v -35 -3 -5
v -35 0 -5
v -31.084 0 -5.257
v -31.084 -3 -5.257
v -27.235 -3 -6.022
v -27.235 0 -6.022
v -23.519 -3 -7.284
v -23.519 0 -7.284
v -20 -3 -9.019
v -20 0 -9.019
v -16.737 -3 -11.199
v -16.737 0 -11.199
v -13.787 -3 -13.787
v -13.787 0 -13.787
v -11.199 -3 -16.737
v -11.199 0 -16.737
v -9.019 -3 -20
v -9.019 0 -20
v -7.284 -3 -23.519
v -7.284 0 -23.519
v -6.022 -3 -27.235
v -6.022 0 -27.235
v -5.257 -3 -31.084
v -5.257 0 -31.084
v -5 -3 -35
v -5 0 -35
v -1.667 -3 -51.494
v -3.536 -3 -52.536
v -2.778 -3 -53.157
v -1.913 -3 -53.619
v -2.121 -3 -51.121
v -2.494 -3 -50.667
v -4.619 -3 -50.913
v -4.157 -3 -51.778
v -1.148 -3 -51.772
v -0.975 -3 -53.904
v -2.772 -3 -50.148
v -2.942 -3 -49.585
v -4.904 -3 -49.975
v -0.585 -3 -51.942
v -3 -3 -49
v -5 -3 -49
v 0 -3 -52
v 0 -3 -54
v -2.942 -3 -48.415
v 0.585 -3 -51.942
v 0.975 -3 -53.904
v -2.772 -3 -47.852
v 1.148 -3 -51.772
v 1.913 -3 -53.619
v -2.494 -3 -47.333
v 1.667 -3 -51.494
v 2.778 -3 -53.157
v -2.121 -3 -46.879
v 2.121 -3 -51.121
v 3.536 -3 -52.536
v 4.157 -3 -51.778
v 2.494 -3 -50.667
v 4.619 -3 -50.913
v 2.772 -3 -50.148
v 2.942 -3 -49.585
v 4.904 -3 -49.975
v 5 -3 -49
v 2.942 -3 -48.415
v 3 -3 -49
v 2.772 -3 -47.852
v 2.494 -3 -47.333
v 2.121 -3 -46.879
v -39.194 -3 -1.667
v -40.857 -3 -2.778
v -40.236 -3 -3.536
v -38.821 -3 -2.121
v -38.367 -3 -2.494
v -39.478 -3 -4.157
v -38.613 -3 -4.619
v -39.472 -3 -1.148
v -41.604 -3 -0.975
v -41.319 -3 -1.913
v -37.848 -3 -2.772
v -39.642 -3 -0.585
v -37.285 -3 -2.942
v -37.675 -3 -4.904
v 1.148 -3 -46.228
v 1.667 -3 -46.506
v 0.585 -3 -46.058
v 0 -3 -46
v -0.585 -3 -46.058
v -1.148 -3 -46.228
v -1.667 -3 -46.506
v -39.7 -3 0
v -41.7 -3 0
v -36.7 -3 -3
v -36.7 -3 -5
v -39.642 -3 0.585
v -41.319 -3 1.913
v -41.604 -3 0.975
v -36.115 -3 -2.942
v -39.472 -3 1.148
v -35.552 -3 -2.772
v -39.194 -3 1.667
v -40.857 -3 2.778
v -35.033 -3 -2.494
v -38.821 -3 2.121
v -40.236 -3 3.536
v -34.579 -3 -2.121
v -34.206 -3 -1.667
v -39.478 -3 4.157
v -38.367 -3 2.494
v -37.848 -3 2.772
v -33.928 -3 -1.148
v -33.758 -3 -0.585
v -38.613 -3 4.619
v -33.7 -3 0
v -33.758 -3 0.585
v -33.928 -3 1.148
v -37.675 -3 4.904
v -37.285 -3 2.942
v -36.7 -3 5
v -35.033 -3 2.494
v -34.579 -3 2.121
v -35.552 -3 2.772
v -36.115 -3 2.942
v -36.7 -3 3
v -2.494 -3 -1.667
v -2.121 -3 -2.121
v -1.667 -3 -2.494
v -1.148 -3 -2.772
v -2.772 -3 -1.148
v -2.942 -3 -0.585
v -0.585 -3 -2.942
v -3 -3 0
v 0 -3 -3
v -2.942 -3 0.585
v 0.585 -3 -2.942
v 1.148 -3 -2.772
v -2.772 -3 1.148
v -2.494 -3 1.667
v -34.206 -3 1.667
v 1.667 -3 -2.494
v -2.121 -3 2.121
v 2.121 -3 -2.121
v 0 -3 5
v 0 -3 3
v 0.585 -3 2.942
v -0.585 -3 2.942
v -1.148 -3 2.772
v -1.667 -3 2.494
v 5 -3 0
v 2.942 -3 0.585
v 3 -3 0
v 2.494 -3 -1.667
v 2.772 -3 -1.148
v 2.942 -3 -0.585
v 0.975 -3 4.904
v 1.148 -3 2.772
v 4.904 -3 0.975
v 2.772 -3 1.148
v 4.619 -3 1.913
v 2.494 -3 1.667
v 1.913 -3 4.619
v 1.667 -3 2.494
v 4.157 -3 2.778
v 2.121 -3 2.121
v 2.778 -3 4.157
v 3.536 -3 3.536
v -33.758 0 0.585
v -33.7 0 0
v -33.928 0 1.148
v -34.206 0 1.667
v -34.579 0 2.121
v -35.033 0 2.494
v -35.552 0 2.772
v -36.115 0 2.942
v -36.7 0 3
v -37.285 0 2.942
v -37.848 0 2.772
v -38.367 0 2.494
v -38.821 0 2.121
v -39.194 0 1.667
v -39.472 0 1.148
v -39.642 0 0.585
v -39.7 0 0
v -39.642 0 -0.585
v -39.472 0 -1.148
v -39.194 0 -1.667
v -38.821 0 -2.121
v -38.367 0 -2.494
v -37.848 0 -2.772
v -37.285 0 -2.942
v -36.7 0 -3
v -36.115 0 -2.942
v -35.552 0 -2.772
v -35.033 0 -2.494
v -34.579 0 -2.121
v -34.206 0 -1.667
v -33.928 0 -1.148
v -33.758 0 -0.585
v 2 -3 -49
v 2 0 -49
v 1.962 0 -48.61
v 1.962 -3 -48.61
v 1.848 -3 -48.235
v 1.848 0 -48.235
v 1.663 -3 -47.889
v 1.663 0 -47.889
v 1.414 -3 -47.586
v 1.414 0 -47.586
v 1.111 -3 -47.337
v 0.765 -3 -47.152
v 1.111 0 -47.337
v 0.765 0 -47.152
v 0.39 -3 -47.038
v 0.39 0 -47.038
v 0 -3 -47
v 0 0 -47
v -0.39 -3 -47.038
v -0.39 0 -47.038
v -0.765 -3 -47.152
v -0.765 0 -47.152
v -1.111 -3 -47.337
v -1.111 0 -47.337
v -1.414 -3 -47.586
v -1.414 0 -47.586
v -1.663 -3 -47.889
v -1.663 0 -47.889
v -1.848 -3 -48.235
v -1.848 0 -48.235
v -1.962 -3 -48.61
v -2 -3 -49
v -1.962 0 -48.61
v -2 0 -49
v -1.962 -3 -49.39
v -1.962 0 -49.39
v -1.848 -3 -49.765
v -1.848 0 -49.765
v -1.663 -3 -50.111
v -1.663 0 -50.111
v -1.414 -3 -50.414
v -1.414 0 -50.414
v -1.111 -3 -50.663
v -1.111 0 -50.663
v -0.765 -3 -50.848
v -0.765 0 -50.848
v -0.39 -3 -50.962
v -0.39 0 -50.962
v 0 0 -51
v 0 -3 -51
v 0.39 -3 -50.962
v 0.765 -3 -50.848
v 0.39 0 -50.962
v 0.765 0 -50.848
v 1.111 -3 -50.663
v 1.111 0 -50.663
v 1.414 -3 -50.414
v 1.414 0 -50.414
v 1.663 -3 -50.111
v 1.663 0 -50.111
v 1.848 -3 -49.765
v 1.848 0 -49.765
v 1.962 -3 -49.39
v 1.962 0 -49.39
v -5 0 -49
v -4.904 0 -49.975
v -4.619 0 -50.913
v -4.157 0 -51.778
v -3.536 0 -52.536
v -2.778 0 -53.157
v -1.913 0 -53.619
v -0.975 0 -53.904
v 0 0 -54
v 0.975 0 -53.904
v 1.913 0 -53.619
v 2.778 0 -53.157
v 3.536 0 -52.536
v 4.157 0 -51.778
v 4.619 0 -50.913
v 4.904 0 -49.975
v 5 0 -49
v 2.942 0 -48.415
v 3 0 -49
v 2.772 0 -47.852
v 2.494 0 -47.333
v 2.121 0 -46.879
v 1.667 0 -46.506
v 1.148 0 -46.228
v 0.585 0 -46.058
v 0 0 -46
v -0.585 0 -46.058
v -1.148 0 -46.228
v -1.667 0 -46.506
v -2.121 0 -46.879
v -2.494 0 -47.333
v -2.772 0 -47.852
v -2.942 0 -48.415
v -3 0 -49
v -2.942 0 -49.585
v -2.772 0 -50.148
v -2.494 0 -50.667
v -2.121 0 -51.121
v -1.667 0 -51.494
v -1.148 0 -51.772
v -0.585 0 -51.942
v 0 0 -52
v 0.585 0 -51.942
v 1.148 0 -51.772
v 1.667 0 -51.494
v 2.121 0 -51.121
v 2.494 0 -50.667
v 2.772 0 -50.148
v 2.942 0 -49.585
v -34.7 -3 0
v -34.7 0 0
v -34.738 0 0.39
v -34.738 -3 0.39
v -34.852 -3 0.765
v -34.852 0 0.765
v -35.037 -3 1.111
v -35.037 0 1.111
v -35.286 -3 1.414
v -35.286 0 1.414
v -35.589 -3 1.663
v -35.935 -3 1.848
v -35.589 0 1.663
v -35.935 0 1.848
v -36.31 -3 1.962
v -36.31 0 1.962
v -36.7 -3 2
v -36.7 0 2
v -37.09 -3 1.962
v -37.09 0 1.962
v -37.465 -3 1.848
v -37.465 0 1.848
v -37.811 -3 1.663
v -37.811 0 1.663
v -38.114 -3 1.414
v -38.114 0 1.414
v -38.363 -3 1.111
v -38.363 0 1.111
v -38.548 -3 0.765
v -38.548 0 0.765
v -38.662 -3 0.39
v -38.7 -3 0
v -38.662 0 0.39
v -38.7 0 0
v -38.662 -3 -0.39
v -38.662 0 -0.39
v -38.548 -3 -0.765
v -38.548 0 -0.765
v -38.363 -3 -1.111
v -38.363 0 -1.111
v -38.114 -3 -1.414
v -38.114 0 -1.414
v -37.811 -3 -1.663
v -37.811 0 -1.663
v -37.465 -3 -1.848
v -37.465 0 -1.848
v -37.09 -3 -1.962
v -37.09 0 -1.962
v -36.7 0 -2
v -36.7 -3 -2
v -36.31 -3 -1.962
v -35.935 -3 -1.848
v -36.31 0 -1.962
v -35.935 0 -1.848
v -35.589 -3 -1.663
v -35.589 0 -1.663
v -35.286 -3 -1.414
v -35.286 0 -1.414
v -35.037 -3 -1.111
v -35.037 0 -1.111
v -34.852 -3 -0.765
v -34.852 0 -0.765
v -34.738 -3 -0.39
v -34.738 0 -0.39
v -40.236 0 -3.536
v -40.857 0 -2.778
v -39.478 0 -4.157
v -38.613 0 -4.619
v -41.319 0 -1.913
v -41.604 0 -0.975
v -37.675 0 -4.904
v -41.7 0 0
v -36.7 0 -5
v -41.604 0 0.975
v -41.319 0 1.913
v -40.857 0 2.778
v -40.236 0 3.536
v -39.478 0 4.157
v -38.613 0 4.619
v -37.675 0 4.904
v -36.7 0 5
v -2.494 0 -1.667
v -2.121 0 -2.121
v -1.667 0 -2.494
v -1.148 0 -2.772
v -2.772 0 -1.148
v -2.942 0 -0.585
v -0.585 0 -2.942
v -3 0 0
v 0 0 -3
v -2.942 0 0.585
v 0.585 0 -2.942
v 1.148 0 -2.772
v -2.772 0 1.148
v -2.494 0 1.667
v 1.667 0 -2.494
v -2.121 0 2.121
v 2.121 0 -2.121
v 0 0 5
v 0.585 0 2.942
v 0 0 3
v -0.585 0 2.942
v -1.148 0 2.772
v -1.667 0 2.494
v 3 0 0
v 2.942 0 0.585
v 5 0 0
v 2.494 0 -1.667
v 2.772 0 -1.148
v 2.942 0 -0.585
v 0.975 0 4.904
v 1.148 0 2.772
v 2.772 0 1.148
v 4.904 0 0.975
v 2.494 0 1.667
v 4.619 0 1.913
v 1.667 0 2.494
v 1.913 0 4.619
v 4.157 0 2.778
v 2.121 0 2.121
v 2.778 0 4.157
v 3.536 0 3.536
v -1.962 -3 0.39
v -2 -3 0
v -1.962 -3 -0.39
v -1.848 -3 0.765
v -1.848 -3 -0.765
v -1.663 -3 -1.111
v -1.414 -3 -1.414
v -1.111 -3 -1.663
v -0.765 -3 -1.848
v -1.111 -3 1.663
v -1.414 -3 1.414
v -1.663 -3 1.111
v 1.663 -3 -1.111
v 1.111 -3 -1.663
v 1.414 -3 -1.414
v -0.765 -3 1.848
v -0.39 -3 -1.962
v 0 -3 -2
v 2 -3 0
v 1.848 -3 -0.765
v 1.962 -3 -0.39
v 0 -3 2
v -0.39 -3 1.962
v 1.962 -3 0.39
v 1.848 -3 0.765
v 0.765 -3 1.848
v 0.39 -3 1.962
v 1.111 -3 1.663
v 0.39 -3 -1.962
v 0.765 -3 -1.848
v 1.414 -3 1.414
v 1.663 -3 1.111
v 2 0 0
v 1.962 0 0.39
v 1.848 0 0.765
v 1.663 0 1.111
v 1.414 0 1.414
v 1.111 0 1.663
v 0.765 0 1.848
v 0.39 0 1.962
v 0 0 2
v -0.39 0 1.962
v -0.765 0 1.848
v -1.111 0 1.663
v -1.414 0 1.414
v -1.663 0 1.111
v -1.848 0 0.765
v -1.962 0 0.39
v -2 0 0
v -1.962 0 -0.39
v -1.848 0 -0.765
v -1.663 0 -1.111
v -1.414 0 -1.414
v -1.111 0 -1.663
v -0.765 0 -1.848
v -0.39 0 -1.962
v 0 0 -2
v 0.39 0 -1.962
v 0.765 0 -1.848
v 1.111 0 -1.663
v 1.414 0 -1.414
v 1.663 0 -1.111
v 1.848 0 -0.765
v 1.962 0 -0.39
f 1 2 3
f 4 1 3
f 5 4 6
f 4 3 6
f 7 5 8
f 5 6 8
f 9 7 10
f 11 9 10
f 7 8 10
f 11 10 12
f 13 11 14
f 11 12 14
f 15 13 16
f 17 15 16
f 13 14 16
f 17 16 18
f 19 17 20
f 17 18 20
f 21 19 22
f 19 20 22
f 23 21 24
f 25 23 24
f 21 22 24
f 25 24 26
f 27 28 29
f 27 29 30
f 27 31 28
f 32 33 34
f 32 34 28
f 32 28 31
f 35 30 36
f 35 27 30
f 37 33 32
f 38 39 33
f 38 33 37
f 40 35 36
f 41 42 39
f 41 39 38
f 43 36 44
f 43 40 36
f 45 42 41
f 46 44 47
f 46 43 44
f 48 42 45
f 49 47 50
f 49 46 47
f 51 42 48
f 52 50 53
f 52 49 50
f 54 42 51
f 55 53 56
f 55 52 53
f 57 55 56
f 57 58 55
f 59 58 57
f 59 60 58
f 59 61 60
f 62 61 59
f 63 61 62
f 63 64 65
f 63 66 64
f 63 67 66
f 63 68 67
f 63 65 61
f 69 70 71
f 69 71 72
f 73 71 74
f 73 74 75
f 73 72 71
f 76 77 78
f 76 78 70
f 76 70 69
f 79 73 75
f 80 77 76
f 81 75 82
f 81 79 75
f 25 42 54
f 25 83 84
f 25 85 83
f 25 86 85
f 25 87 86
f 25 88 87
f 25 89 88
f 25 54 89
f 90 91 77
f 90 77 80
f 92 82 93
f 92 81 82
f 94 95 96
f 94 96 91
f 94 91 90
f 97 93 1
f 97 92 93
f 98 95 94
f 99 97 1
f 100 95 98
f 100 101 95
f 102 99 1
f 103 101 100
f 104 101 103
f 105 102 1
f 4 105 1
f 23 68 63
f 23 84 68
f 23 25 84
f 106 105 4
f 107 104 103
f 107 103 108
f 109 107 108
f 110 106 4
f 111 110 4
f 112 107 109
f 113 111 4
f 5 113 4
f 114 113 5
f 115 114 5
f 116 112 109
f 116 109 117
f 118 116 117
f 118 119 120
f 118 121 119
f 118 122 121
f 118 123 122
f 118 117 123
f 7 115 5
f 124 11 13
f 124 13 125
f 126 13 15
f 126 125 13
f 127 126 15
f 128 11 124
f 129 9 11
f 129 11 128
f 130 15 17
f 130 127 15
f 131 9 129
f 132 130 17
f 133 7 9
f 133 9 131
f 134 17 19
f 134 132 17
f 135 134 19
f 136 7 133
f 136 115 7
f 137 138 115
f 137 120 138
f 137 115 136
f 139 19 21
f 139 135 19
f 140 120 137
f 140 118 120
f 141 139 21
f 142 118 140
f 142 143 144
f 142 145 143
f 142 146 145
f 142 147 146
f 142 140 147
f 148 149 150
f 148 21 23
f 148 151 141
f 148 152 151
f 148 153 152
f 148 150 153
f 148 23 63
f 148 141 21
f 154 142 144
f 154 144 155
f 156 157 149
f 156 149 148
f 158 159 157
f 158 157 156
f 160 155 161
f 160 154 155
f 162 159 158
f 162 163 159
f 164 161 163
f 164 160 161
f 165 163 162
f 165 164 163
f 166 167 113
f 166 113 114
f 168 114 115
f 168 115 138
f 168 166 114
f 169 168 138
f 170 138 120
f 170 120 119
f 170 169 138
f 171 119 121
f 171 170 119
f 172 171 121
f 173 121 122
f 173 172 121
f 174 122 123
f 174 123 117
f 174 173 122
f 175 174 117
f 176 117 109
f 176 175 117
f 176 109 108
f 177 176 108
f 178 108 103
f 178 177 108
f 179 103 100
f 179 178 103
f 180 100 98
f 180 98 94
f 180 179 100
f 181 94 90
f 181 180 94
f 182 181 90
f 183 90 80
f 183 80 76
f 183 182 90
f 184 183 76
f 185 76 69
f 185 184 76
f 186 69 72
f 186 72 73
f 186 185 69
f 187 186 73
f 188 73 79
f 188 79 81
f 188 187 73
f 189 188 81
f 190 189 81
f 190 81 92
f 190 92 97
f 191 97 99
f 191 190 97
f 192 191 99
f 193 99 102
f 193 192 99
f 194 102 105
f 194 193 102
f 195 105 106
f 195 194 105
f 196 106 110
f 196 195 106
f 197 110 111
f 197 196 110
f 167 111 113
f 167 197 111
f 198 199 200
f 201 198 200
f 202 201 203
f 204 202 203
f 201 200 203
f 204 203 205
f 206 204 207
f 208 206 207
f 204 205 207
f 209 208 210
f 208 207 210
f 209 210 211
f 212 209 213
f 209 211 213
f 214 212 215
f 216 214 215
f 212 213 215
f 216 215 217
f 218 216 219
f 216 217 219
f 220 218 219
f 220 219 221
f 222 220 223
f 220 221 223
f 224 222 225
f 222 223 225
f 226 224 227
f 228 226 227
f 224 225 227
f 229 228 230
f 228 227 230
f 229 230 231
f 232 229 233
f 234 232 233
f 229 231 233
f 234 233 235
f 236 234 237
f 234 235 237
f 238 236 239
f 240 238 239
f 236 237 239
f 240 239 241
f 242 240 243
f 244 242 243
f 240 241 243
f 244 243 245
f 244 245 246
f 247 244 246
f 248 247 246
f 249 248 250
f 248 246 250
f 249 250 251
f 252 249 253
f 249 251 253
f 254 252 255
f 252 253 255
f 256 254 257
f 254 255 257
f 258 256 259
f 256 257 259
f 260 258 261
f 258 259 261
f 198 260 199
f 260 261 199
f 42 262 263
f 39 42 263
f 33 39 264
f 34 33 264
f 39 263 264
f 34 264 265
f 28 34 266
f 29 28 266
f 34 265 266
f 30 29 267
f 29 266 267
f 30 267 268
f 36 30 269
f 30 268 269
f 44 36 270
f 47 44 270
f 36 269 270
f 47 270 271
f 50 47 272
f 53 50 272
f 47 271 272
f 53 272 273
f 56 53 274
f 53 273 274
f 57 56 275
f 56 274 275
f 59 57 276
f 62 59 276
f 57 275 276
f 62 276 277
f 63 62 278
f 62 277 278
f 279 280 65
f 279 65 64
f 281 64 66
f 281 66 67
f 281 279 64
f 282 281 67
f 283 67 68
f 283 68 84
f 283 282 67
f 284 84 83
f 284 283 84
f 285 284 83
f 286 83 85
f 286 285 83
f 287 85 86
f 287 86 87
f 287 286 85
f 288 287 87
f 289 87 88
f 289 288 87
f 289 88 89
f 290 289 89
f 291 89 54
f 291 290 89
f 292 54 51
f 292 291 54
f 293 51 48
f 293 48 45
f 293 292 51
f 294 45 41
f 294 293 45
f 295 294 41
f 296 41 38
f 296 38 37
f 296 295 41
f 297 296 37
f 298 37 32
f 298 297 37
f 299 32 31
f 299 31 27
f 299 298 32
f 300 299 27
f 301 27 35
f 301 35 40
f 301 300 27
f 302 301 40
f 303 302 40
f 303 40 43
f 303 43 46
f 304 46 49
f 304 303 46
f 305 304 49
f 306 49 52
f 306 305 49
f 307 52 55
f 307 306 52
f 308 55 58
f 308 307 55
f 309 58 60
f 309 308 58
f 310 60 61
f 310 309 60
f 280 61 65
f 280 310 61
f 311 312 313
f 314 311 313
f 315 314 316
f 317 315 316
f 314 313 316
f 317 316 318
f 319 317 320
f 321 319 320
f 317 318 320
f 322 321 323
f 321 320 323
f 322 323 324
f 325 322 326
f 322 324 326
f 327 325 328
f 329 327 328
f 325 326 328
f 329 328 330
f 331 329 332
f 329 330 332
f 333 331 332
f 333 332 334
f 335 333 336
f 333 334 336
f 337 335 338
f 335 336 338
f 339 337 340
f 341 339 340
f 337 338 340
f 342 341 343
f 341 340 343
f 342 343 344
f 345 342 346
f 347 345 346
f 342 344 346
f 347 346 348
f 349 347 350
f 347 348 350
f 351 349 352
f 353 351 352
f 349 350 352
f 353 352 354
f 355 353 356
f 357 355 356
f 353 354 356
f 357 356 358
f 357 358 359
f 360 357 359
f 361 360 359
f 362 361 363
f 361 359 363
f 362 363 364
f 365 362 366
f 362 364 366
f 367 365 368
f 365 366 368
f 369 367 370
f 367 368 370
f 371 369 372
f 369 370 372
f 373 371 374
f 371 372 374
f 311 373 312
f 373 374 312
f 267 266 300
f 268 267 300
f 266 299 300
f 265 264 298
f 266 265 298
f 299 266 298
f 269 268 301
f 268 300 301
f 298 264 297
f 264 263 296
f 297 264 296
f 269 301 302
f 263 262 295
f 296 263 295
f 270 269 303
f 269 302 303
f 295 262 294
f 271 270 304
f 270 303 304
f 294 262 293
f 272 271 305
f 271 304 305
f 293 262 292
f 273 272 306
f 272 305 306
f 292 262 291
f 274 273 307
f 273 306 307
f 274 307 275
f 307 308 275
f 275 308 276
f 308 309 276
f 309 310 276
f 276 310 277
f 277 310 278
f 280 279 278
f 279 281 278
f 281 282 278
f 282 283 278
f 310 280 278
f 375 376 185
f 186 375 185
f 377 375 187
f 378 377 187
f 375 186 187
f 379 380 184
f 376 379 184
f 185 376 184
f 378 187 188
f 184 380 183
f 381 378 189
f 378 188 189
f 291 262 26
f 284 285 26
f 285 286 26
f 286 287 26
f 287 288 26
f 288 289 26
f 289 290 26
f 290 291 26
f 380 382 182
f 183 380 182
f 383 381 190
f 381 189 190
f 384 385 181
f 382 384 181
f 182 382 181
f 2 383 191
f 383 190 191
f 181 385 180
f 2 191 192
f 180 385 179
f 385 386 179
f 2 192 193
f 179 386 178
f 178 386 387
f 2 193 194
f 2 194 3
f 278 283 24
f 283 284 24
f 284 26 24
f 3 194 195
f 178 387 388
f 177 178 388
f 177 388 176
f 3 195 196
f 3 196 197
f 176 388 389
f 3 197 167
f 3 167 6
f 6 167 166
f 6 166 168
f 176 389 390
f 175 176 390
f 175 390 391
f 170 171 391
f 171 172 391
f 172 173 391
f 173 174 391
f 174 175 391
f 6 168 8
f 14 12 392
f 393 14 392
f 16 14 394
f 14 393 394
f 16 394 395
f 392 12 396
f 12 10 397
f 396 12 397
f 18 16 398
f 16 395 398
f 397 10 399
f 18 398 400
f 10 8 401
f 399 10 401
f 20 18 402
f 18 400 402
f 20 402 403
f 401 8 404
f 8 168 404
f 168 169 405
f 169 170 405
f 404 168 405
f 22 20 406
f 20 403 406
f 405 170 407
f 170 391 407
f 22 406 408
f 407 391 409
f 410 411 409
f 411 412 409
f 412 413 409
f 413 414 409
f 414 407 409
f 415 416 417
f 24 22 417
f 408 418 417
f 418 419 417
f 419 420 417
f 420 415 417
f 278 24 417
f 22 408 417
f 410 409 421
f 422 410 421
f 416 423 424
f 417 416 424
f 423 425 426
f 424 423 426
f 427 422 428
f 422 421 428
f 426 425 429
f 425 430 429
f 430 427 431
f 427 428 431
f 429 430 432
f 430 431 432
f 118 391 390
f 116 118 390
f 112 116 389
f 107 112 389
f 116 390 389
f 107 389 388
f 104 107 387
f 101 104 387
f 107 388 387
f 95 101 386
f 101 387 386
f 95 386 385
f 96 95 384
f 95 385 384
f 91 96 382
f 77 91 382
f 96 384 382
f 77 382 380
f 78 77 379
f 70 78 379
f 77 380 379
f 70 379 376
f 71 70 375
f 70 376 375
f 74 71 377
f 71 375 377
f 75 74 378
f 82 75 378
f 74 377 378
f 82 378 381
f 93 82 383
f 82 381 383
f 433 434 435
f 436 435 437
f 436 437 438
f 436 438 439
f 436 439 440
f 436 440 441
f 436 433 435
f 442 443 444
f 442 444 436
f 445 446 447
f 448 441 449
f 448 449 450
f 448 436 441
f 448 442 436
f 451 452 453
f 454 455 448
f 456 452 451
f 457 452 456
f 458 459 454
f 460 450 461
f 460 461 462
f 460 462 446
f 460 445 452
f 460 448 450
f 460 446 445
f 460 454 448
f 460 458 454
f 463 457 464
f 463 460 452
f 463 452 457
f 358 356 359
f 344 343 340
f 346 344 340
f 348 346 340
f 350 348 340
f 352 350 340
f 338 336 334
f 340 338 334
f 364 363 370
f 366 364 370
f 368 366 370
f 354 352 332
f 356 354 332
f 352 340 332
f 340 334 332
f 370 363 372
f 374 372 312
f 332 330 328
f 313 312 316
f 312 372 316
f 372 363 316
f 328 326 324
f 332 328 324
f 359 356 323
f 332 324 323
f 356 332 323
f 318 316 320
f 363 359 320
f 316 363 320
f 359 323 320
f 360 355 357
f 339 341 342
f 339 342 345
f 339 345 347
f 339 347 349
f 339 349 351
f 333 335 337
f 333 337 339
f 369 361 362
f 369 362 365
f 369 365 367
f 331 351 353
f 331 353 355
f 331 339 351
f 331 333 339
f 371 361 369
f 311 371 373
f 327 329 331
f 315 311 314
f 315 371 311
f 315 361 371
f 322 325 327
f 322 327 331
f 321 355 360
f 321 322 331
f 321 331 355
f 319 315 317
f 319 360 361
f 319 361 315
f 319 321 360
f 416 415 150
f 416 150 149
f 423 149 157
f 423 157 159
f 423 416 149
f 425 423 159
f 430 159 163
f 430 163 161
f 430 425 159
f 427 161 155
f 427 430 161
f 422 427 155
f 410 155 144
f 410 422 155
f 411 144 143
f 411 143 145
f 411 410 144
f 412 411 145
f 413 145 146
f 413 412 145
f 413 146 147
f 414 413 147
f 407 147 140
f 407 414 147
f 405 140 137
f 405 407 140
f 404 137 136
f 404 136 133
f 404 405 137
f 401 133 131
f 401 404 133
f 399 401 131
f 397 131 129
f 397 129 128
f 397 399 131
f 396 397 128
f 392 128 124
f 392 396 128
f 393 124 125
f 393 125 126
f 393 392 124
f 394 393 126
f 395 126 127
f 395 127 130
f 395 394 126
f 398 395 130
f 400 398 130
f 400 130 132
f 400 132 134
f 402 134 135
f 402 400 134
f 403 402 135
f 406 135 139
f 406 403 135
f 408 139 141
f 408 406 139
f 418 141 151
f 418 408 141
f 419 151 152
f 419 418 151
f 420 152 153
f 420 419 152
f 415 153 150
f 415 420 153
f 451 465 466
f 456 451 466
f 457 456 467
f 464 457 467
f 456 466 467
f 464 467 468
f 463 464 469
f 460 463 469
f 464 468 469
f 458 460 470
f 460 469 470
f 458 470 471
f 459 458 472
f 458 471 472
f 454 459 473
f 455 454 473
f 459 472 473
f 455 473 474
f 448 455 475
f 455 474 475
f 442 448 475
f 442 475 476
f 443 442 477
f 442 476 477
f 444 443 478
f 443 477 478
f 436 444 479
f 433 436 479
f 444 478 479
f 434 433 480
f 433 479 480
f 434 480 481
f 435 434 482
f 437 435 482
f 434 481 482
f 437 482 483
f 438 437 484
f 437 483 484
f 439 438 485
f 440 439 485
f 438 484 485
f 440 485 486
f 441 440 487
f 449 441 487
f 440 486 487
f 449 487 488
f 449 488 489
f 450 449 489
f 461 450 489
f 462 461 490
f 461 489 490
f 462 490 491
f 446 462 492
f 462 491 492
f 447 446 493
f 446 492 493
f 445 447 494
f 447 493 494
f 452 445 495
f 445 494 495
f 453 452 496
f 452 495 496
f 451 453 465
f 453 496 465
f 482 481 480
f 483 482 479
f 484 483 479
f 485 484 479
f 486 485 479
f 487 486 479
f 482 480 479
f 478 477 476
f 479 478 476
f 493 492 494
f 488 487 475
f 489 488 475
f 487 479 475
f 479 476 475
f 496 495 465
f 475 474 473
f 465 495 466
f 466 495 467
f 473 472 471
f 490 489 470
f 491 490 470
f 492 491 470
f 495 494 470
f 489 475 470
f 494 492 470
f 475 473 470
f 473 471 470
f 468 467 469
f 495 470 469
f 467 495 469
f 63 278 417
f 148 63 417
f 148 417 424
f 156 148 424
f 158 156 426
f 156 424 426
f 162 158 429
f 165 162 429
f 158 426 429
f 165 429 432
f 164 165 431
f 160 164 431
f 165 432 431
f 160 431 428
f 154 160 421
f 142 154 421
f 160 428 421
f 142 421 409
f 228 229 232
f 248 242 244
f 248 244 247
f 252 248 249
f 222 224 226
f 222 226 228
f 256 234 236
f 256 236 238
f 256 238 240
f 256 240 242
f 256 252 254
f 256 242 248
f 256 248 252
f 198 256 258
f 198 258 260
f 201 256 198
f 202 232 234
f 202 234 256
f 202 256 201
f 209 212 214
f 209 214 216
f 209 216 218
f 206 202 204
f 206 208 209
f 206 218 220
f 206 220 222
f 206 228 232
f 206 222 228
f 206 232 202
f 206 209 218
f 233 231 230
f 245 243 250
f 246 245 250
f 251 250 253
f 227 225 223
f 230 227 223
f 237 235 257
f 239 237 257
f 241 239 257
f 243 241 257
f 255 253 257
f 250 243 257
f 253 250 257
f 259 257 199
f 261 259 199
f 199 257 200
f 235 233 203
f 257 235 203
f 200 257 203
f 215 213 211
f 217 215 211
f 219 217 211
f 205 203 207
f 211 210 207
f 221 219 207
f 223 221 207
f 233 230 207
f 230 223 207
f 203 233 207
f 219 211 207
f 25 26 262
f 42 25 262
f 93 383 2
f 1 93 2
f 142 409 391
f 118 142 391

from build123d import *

# Parameters (mm, degrees)
F0_R     = 3
F0_R_2   = 2
F1_DEPTH = 3


with BuildPart() as f1:
    # F0 (on Front) → F1 (new body)
    with BuildSketch(Plane.XZ):
        with BuildLine():
            Line((0, 5), (-36.7, 5))
            ThreePointArc((-36.7, 5), (-41.7, 0), (-36.7, -5))
            Line((-36.7, -5), (-35, -5))
            ThreePointArc((-35, -5), (-13.786797, -13.786797), (-5, -35))
            Line((-5, -35), (-5, -49))
            ThreePointArc((-5, -49), (0, -54), (5, -49))
            Line((5, -49), (5, 0))
            ThreePointArc((5, 0), (3.535534, 3.535534), (0, 5))
        make_face()
        with Locations((0, -49)):
            Circle(F0_R, mode=Mode.SUBTRACT)
        with Locations((-36.7, 0)):
            Circle(F0_R, mode=Mode.SUBTRACT)
        Circle(F0_R, mode=Mode.SUBTRACT)
        with Locations((-36.7, 0)):
            Circle(F0_R_2)
        Circle(F0_R_2)
        with Locations((0, -49)):
            Circle(F0_R_2)
    extrude(amount=F1_DEPTH)


solid = f1.part
